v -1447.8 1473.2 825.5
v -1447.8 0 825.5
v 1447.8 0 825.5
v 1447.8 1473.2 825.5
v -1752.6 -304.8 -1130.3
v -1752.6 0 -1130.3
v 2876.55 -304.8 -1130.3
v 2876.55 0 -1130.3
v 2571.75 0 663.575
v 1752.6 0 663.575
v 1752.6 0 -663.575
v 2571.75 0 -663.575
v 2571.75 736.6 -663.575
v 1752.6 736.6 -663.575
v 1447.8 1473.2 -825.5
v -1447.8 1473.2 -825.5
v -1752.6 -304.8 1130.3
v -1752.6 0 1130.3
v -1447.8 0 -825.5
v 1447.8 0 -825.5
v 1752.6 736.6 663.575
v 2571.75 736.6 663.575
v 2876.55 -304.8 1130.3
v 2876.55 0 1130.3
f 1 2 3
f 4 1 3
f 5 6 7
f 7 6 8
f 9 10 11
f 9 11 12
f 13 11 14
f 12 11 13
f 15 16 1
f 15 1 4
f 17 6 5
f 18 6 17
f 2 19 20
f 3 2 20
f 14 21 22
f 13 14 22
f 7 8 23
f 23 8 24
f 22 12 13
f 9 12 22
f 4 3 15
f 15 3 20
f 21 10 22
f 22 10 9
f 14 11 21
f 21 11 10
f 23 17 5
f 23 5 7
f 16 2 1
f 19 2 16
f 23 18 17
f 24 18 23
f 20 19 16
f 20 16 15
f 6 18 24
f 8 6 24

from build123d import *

# Parameters (mm, degrees)
SKETCH1_W           = 2895.6
SKETCH1_H           = 1651
BOSS_EXTRUDE1_DEPTH = 1473.2
SKETCH2_W           = 819.15
SKETCH2_H           = 1327.15
BOSS_EXTRUDE2_DEPTH = 736.6
SKETCH3_W           = 4629.15
SKETCH3_H           = 2260.6
BOSS_EXTRUDE3_DEPTH = 304.8


with BuildPart() as part:
    # Sketch1 → Boss-Extrude1 (new body)
    with BuildSketch(Plane(origin=(0, 0, 0), x_dir=(1, 0, 0), z_dir=(0, 1, 0))):
        Rectangle(SKETCH1_W, SKETCH1_H)
    extrude(amount=BOSS_EXTRUDE1_DEPTH)


with BuildPart() as body_2:
    # Sketch2 → Boss-Extrude2 (new body)
    with BuildSketch(Plane.XZ):
        with Locations((2162.175, 0)):
            Rectangle(SKETCH2_W, SKETCH2_H)
    extrude(amount=-BOSS_EXTRUDE2_DEPTH)


with BuildPart() as body_3:
    # Sketch3 → Boss-Extrude3 (new body)
    with BuildSketch(Plane.XZ):
        with Locations((561.975, 0)):
            Rectangle(SKETCH3_W, SKETCH3_H)
    extrude(amount=BOSS_EXTRUDE3_DEPTH)


solid = Compound([part.part, body_2.part, body_3.part])
